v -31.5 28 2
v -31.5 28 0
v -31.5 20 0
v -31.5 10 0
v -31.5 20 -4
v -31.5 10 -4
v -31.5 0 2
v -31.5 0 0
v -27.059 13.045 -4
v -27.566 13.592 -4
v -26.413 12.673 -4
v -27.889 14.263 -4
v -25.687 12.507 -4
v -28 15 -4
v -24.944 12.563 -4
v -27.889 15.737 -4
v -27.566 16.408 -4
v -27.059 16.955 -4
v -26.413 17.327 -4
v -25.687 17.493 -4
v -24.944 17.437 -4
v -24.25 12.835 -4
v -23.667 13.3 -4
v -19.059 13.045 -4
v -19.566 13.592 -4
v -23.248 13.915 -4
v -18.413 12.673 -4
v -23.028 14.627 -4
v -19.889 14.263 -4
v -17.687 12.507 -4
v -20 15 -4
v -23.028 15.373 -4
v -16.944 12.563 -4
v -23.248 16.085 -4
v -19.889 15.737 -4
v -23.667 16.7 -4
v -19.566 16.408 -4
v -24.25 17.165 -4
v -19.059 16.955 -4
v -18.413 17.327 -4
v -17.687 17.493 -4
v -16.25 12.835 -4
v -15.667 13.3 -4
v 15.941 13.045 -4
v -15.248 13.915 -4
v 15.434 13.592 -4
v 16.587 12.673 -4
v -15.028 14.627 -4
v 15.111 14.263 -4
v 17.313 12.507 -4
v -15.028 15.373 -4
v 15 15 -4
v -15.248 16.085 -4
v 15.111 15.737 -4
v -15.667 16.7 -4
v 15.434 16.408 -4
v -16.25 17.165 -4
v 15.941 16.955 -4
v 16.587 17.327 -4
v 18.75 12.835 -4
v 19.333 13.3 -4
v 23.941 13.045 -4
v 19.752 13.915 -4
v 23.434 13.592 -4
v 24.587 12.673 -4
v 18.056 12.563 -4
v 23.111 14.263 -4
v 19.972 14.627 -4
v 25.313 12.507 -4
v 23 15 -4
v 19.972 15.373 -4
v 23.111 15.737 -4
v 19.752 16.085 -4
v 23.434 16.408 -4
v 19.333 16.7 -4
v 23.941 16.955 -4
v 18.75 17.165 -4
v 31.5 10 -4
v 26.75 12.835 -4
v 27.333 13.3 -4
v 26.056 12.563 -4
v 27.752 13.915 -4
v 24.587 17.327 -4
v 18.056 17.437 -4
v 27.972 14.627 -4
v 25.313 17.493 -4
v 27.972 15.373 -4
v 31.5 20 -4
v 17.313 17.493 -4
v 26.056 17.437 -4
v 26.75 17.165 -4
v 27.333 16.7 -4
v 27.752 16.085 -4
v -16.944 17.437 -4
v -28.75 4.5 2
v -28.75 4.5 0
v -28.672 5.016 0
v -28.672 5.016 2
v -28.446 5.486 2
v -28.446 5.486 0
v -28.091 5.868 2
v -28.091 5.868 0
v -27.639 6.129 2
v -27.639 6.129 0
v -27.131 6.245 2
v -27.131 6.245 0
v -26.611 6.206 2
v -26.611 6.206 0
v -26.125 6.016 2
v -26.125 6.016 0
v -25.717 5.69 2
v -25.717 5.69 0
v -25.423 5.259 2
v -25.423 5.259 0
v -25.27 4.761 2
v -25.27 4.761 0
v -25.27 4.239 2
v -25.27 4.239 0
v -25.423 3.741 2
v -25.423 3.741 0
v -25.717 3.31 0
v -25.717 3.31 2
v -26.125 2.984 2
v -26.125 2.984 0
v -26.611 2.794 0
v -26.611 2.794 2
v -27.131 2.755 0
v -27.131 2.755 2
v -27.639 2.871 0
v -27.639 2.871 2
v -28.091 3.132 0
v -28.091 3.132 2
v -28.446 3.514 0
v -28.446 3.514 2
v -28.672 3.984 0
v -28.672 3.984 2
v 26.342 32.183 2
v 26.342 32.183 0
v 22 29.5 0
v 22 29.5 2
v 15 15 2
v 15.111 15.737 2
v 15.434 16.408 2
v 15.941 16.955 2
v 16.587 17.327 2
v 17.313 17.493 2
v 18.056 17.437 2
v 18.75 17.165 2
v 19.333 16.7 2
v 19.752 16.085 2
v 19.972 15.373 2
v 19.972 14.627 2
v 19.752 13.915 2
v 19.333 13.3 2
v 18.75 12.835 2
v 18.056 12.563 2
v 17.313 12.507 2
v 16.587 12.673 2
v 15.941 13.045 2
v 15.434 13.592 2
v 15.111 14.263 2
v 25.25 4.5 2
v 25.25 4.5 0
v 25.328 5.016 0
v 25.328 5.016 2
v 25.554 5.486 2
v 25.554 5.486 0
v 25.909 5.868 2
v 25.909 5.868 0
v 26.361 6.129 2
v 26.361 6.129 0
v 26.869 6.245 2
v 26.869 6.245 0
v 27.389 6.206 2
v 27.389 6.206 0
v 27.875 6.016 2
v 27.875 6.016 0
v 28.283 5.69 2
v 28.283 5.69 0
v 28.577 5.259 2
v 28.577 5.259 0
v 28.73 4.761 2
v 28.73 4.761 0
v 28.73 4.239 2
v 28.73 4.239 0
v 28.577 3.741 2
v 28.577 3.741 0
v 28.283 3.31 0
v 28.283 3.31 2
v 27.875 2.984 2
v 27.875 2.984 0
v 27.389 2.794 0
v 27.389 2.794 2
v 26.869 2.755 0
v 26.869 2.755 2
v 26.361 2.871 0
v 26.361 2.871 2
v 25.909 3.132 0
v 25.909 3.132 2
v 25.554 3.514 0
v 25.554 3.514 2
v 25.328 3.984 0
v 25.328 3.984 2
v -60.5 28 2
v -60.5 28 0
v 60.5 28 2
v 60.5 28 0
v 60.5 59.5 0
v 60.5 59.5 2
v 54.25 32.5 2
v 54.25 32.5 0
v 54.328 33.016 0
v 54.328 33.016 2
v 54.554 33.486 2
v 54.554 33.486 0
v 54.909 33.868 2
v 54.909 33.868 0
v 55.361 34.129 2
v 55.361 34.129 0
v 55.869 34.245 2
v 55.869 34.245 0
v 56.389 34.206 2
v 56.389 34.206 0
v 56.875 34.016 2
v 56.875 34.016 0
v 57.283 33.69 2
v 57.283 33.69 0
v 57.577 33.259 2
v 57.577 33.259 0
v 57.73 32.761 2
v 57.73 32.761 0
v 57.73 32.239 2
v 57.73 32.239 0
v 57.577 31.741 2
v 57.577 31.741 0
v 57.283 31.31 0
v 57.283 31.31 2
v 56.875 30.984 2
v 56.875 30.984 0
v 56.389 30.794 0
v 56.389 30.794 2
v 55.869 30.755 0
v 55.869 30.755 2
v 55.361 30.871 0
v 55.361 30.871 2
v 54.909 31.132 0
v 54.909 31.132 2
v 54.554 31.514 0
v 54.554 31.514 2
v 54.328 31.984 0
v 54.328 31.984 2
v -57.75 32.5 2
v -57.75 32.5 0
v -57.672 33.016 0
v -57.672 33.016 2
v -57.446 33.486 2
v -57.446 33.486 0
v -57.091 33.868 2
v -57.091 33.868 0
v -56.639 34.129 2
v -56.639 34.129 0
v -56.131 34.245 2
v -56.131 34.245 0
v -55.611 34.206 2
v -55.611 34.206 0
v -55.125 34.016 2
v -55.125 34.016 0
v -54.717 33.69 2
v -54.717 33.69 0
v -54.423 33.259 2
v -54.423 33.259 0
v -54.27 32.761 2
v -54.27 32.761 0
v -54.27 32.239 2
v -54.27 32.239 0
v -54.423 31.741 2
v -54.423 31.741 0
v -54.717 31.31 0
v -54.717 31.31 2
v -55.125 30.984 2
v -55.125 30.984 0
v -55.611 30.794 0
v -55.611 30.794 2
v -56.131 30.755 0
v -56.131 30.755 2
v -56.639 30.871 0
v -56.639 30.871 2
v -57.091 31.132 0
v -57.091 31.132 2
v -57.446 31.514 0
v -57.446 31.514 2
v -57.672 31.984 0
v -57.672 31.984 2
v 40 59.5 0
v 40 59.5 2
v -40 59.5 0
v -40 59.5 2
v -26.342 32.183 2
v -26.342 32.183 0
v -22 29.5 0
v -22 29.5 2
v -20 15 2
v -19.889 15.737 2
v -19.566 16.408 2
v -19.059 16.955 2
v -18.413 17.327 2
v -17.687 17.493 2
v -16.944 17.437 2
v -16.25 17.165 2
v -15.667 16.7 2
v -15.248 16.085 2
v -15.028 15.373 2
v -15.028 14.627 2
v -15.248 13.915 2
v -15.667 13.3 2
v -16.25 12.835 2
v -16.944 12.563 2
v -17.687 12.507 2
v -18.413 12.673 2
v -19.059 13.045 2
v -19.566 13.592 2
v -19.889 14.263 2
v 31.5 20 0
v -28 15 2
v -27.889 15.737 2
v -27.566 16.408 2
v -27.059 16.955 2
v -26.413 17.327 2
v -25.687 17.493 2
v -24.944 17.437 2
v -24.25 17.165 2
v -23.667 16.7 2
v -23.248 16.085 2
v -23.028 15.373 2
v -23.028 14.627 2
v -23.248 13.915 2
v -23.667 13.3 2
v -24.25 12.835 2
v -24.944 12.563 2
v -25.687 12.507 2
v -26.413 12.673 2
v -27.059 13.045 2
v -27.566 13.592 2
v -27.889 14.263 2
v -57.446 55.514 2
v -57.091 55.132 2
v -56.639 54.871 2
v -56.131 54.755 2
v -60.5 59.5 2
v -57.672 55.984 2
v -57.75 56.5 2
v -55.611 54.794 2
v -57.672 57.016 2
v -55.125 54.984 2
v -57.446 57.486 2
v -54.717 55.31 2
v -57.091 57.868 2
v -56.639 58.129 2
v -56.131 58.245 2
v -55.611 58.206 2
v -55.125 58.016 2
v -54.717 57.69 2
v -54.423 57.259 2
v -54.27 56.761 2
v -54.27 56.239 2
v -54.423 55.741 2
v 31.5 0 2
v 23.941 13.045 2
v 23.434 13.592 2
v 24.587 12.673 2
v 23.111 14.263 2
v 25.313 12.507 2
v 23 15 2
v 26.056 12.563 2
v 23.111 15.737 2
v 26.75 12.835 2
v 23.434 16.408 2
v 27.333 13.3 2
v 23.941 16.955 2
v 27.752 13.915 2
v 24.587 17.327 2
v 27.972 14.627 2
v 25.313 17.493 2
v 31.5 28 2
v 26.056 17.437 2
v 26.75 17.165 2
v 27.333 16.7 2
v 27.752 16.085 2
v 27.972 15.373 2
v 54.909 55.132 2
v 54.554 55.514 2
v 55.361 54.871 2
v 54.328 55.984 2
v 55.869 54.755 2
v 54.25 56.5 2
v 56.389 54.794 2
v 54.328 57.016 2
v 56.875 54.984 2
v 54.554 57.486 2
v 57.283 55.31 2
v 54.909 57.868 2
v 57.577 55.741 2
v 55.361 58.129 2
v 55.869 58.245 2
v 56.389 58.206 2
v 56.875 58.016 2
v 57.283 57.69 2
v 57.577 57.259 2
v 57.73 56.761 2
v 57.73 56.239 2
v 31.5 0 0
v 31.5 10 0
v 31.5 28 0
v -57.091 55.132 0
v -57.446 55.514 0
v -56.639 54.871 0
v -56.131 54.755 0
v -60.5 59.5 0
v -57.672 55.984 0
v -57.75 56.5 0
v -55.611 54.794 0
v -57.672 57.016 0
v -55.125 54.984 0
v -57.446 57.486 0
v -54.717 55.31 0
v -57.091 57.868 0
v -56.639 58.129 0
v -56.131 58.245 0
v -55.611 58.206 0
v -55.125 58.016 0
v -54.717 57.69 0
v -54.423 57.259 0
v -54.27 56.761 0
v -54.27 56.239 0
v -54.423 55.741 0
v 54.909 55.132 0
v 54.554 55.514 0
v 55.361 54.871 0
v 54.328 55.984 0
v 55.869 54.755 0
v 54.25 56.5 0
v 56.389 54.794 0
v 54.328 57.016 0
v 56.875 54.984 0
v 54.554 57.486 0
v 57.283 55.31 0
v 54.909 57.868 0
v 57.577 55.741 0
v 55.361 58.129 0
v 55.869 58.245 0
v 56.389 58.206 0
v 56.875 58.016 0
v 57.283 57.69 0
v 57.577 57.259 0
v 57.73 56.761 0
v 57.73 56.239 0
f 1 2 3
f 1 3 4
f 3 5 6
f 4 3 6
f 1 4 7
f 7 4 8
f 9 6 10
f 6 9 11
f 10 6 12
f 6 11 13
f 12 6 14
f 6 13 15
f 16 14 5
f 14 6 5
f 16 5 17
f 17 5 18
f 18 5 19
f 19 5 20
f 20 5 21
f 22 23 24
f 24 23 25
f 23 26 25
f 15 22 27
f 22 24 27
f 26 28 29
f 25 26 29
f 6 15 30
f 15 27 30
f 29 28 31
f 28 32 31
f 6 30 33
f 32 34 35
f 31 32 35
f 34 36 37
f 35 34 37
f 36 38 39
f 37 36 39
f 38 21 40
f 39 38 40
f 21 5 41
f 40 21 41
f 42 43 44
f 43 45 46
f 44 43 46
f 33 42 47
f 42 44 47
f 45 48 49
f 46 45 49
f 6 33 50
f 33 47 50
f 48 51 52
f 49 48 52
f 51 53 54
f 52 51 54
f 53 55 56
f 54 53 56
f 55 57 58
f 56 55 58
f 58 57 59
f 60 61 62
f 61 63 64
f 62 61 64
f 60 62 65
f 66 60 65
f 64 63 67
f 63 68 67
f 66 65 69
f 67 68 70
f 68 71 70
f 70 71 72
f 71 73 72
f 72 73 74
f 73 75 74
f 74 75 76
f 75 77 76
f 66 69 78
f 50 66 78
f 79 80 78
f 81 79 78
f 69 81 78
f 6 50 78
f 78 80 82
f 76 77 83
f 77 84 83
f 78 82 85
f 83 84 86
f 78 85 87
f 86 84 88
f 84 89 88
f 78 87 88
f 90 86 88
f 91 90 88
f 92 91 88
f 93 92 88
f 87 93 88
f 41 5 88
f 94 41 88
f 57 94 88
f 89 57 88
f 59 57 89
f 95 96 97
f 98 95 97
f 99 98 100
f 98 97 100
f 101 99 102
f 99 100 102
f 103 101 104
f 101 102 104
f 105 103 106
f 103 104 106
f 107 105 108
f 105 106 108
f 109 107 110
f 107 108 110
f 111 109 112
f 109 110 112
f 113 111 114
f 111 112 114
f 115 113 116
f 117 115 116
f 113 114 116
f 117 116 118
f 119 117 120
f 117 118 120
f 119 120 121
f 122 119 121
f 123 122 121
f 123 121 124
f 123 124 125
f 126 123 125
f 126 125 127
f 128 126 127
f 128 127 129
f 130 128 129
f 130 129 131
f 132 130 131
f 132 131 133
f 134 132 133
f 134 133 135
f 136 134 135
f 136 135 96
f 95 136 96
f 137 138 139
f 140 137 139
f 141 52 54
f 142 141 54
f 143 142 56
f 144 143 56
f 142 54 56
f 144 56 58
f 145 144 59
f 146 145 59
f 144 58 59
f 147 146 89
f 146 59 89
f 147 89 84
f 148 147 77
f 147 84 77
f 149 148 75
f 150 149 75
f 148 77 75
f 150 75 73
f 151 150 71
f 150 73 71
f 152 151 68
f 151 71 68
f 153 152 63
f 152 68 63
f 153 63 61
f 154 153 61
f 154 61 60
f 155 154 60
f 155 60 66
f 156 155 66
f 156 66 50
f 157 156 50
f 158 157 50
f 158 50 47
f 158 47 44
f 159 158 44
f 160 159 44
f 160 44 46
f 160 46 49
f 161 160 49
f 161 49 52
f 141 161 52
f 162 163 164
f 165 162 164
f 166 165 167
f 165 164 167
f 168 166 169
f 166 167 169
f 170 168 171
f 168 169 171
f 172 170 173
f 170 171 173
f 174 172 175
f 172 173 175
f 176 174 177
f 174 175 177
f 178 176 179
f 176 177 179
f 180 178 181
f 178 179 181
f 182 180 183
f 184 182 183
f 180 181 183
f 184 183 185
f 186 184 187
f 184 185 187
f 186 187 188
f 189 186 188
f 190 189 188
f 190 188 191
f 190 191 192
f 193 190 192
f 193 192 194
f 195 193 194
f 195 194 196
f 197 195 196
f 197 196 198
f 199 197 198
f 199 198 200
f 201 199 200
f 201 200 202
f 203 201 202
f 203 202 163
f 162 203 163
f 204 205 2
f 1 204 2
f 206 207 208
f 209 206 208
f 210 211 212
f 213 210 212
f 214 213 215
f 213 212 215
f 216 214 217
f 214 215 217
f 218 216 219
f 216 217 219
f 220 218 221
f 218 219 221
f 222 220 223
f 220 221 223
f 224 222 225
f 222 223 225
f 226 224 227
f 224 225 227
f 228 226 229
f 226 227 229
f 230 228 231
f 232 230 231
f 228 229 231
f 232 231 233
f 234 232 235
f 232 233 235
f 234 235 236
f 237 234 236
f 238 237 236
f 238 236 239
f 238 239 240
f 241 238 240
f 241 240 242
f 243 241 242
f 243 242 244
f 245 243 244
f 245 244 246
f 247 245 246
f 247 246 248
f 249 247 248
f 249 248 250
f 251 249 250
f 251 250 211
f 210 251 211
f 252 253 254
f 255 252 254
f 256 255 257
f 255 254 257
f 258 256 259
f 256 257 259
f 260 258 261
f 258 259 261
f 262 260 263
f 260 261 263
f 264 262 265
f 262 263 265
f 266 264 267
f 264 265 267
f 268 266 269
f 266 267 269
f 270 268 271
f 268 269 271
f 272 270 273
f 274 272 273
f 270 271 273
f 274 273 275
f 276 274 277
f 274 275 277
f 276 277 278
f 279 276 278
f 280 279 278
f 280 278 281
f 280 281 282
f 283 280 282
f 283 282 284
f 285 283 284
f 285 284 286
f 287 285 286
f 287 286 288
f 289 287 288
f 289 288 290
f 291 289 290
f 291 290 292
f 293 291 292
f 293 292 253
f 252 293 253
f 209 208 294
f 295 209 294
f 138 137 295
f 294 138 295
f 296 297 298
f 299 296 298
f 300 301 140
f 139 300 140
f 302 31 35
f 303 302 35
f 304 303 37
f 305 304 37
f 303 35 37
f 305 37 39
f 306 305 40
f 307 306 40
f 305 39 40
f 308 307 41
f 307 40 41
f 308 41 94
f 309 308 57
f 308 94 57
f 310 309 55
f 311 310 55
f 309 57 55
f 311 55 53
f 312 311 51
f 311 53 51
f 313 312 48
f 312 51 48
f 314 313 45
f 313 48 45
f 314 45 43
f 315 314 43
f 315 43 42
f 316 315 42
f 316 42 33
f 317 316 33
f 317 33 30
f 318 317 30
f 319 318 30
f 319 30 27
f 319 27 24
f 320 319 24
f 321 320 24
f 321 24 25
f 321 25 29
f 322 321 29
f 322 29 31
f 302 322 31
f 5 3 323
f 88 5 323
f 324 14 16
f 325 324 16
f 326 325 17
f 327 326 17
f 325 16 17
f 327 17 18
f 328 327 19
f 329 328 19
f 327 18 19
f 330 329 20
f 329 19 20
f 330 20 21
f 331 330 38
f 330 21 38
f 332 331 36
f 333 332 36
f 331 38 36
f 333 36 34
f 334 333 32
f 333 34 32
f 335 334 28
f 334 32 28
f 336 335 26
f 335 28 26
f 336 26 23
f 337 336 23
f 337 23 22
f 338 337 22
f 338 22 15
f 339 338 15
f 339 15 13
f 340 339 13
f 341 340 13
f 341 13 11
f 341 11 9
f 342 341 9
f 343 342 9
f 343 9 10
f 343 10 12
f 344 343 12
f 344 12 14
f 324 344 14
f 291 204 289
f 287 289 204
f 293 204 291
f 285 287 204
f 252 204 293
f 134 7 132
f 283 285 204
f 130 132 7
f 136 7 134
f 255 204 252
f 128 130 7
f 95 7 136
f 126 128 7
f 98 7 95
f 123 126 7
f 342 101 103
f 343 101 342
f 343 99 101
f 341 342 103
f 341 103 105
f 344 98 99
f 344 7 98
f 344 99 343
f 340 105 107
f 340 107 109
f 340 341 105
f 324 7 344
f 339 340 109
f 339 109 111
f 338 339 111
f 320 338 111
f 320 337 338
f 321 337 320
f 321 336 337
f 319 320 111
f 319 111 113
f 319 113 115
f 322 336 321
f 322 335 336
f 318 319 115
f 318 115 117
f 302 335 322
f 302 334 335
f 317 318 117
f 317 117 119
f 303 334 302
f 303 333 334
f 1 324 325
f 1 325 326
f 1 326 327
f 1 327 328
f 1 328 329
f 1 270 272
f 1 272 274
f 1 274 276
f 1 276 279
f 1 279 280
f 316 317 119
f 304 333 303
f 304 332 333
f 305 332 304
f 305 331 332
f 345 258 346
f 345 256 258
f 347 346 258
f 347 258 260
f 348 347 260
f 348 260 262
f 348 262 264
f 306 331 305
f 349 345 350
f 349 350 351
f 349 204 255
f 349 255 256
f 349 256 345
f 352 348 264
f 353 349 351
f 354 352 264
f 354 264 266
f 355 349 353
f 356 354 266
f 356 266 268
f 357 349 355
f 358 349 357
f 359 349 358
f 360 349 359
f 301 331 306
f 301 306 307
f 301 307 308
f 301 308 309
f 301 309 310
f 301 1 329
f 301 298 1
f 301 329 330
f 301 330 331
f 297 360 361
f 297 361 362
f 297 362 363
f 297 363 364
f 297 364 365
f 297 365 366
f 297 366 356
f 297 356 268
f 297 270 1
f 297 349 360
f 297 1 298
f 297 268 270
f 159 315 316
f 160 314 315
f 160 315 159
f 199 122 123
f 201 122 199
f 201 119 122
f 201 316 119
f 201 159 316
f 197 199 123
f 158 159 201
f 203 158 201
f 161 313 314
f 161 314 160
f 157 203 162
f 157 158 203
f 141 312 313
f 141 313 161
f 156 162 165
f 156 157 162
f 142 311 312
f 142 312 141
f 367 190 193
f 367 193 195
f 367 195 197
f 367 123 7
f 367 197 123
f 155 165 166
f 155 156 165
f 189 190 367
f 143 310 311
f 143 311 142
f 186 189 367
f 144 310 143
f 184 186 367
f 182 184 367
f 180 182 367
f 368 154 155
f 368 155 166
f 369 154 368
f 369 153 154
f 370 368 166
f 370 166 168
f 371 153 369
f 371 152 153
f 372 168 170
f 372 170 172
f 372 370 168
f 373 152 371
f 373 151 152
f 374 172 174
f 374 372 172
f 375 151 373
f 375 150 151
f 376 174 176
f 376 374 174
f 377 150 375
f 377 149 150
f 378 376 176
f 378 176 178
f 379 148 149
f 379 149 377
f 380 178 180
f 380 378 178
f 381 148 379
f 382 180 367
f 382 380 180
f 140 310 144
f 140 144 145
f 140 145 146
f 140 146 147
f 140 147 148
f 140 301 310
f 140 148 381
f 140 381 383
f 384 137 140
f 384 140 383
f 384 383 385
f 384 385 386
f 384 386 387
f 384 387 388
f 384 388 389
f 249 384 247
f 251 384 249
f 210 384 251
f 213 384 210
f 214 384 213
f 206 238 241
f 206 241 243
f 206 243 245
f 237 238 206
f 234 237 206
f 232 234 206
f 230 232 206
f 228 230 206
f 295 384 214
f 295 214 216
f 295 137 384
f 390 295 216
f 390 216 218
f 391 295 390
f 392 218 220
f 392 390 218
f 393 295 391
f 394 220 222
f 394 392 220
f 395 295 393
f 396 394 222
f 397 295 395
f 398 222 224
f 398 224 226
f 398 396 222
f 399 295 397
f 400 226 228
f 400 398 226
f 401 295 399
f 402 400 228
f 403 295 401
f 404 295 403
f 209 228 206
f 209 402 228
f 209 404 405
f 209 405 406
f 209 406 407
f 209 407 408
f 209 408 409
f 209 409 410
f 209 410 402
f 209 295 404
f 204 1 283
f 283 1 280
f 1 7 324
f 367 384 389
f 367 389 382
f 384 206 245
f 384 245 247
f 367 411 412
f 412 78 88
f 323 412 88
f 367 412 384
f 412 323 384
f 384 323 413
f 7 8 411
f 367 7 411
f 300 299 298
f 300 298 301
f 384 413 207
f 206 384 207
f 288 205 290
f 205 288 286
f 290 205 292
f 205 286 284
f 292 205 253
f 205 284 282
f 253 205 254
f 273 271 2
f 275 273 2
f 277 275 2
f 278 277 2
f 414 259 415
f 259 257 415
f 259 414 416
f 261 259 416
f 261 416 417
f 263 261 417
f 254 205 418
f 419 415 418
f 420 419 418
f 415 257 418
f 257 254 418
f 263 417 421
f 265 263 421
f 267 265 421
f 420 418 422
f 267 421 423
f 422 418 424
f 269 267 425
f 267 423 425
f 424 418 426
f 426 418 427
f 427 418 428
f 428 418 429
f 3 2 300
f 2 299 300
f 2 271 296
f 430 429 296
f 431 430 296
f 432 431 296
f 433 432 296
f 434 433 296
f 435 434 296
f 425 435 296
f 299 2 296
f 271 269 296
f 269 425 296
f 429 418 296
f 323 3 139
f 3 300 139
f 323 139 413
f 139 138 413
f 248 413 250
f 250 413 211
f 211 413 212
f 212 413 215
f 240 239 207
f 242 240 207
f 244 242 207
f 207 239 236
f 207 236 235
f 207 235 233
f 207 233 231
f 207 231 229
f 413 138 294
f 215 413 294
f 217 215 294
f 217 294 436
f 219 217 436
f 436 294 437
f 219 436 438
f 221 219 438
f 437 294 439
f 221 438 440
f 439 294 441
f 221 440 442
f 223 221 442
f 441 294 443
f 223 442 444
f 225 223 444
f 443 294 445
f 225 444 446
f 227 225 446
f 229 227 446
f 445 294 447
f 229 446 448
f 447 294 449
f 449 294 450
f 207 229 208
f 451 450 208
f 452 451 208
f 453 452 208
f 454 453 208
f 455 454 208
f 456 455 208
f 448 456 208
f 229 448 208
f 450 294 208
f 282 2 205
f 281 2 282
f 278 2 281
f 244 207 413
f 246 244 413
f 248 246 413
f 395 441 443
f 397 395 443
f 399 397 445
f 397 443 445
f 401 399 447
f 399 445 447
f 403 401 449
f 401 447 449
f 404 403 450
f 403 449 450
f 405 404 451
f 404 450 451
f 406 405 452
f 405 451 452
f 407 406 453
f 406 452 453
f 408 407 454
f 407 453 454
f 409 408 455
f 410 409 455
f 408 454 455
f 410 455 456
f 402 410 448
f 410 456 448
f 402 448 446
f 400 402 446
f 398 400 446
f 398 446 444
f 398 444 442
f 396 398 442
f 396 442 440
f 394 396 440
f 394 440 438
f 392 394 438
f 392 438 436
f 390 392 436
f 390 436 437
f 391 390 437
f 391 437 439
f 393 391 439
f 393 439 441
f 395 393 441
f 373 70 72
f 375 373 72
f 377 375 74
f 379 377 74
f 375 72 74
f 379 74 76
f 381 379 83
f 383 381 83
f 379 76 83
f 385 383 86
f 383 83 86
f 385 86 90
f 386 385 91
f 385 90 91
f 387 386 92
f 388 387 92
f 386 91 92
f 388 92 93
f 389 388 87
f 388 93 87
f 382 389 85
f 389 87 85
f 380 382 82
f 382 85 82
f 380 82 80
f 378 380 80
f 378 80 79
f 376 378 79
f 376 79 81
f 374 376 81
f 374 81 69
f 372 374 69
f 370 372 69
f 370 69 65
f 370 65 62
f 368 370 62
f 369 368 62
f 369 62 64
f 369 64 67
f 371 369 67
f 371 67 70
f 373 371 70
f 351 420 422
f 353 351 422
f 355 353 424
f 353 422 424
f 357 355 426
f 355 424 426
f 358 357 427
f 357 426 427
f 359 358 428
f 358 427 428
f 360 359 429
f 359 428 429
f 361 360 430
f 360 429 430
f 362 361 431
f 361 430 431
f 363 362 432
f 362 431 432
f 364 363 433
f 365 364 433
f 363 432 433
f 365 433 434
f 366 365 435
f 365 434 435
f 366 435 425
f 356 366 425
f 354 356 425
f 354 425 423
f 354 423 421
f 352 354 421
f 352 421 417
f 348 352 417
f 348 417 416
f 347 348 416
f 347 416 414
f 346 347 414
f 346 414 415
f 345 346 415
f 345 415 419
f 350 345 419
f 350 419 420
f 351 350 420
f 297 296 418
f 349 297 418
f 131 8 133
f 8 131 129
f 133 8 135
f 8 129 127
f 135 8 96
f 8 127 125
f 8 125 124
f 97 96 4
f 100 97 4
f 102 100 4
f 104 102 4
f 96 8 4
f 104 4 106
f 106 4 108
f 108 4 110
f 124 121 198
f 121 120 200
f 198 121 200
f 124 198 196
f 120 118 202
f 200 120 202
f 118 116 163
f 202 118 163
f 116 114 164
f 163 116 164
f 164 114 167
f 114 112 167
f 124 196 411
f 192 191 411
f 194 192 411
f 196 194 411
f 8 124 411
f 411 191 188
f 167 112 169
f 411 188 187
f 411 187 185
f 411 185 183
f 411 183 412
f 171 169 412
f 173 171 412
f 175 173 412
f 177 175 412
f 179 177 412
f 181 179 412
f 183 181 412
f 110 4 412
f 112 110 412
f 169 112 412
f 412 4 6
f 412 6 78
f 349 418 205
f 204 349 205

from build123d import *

# Parameters (mm, degrees)
P_IDAT_VYSUNUT_M1_DEPTH  = 2
SKICA2_R                 = 1.75
ODEBRAT_VYSUNUT_M1_DEPTH = 10
SKICA3_W                 = 63
SKICA3_H                 = 10
P_IDAT_VYSUNUT_M2_DEPTH  = 4
SKICA4_R                 = 2.5
ODEBRAT_VYSUNUT_M2_DEPTH = 24
ODEBRAT_VYSUNUT_M3_DEPTH = 10
P_IDAT_VYSUNUT_M3_DEPTH  = 2


with BuildPart() as part:
    # Skica1 → Přidat vysunutím1 (new body)
    with BuildSketch(Plane.XY):
        Polygon((-31.5, 0), (31.5, 0), (31.5, 28), (60.5, 28), (60.5, 59.5), (-60.5, 59.5), (-60.5, 28), (-31.5, 28), align=None)
    extrude(amount=P_IDAT_VYSUNUT_M1_DEPTH)

    # Skica2 → Odebrat vysunutím1 (cut)
    with BuildSketch(Plane(origin=(0, 0, 0), x_dir=(-1, 0, 0), z_dir=(0, 0, -1))):
        with Locations((-56, 56.5)):
            Circle(SKICA2_R)
        with Locations((-56, 32.5)):
            Circle(SKICA2_R)
        with Locations((-27, 4.5)):
            Circle(SKICA2_R)
        with Locations((27, 4.5)):
            Circle(SKICA2_R)
        with Locations((56, 32.5)):
            Circle(SKICA2_R)
        with Locations((56, 56.5)):
            Circle(SKICA2_R)
    extrude(amount=-ODEBRAT_VYSUNUT_M1_DEPTH, mode=Mode.SUBTRACT)

    # Skica3 → Přidat vysunutím2 (add)
    with BuildSketch(Plane.XY):
        with Locations((0, 15)):
            Rectangle(SKICA3_W, SKICA3_H)
    extrude(amount=-P_IDAT_VYSUNUT_M2_DEPTH)

    # Skica4 → Odebrat vysunutím2 (cut)
    with BuildSketch(Plane(origin=(0, 0, -4), x_dir=(-1, 0, 0), z_dir=(0, 0, -1))):
        with Locations((17.5, 15)):
            Circle(SKICA4_R)
        with Locations((25.5, 15)):
            Circle(SKICA4_R)
        with Locations((-25.5, 15)):
            Circle(SKICA4_R)
        with Locations((-17.5, 15)):
            Circle(SKICA4_R)
    extrude(amount=-ODEBRAT_VYSUNUT_M2_DEPTH, mode=Mode.SUBTRACT)

    # Skica5 → Odebrat vysunutím3 (cut)
    with BuildSketch(Plane.XY.offset(2)):
        Polygon((40, 59.5), (-40, 59.5), (-25, 29.5), (25, 29.5), align=None)
    extrude(amount=-ODEBRAT_VYSUNUT_M3_DEPTH, mode=Mode.SUBTRACT)

    # Skica6 → Přidat vysunutím3 (add)
    with BuildSketch(Plane(origin=(0, 0, 0), x_dir=(-1, 0, 0), z_dir=(0, 0, -1))):
        Polygon((-25, 29.5), (-26.341640786, 32.183281573), (-22, 29.5), align=None)
        Polygon((25, 29.5), (26.341640786, 32.183281573), (22, 29.5), align=None)
    extrude(amount=-P_IDAT_VYSUNUT_M3_DEPTH)


solid = part.part
